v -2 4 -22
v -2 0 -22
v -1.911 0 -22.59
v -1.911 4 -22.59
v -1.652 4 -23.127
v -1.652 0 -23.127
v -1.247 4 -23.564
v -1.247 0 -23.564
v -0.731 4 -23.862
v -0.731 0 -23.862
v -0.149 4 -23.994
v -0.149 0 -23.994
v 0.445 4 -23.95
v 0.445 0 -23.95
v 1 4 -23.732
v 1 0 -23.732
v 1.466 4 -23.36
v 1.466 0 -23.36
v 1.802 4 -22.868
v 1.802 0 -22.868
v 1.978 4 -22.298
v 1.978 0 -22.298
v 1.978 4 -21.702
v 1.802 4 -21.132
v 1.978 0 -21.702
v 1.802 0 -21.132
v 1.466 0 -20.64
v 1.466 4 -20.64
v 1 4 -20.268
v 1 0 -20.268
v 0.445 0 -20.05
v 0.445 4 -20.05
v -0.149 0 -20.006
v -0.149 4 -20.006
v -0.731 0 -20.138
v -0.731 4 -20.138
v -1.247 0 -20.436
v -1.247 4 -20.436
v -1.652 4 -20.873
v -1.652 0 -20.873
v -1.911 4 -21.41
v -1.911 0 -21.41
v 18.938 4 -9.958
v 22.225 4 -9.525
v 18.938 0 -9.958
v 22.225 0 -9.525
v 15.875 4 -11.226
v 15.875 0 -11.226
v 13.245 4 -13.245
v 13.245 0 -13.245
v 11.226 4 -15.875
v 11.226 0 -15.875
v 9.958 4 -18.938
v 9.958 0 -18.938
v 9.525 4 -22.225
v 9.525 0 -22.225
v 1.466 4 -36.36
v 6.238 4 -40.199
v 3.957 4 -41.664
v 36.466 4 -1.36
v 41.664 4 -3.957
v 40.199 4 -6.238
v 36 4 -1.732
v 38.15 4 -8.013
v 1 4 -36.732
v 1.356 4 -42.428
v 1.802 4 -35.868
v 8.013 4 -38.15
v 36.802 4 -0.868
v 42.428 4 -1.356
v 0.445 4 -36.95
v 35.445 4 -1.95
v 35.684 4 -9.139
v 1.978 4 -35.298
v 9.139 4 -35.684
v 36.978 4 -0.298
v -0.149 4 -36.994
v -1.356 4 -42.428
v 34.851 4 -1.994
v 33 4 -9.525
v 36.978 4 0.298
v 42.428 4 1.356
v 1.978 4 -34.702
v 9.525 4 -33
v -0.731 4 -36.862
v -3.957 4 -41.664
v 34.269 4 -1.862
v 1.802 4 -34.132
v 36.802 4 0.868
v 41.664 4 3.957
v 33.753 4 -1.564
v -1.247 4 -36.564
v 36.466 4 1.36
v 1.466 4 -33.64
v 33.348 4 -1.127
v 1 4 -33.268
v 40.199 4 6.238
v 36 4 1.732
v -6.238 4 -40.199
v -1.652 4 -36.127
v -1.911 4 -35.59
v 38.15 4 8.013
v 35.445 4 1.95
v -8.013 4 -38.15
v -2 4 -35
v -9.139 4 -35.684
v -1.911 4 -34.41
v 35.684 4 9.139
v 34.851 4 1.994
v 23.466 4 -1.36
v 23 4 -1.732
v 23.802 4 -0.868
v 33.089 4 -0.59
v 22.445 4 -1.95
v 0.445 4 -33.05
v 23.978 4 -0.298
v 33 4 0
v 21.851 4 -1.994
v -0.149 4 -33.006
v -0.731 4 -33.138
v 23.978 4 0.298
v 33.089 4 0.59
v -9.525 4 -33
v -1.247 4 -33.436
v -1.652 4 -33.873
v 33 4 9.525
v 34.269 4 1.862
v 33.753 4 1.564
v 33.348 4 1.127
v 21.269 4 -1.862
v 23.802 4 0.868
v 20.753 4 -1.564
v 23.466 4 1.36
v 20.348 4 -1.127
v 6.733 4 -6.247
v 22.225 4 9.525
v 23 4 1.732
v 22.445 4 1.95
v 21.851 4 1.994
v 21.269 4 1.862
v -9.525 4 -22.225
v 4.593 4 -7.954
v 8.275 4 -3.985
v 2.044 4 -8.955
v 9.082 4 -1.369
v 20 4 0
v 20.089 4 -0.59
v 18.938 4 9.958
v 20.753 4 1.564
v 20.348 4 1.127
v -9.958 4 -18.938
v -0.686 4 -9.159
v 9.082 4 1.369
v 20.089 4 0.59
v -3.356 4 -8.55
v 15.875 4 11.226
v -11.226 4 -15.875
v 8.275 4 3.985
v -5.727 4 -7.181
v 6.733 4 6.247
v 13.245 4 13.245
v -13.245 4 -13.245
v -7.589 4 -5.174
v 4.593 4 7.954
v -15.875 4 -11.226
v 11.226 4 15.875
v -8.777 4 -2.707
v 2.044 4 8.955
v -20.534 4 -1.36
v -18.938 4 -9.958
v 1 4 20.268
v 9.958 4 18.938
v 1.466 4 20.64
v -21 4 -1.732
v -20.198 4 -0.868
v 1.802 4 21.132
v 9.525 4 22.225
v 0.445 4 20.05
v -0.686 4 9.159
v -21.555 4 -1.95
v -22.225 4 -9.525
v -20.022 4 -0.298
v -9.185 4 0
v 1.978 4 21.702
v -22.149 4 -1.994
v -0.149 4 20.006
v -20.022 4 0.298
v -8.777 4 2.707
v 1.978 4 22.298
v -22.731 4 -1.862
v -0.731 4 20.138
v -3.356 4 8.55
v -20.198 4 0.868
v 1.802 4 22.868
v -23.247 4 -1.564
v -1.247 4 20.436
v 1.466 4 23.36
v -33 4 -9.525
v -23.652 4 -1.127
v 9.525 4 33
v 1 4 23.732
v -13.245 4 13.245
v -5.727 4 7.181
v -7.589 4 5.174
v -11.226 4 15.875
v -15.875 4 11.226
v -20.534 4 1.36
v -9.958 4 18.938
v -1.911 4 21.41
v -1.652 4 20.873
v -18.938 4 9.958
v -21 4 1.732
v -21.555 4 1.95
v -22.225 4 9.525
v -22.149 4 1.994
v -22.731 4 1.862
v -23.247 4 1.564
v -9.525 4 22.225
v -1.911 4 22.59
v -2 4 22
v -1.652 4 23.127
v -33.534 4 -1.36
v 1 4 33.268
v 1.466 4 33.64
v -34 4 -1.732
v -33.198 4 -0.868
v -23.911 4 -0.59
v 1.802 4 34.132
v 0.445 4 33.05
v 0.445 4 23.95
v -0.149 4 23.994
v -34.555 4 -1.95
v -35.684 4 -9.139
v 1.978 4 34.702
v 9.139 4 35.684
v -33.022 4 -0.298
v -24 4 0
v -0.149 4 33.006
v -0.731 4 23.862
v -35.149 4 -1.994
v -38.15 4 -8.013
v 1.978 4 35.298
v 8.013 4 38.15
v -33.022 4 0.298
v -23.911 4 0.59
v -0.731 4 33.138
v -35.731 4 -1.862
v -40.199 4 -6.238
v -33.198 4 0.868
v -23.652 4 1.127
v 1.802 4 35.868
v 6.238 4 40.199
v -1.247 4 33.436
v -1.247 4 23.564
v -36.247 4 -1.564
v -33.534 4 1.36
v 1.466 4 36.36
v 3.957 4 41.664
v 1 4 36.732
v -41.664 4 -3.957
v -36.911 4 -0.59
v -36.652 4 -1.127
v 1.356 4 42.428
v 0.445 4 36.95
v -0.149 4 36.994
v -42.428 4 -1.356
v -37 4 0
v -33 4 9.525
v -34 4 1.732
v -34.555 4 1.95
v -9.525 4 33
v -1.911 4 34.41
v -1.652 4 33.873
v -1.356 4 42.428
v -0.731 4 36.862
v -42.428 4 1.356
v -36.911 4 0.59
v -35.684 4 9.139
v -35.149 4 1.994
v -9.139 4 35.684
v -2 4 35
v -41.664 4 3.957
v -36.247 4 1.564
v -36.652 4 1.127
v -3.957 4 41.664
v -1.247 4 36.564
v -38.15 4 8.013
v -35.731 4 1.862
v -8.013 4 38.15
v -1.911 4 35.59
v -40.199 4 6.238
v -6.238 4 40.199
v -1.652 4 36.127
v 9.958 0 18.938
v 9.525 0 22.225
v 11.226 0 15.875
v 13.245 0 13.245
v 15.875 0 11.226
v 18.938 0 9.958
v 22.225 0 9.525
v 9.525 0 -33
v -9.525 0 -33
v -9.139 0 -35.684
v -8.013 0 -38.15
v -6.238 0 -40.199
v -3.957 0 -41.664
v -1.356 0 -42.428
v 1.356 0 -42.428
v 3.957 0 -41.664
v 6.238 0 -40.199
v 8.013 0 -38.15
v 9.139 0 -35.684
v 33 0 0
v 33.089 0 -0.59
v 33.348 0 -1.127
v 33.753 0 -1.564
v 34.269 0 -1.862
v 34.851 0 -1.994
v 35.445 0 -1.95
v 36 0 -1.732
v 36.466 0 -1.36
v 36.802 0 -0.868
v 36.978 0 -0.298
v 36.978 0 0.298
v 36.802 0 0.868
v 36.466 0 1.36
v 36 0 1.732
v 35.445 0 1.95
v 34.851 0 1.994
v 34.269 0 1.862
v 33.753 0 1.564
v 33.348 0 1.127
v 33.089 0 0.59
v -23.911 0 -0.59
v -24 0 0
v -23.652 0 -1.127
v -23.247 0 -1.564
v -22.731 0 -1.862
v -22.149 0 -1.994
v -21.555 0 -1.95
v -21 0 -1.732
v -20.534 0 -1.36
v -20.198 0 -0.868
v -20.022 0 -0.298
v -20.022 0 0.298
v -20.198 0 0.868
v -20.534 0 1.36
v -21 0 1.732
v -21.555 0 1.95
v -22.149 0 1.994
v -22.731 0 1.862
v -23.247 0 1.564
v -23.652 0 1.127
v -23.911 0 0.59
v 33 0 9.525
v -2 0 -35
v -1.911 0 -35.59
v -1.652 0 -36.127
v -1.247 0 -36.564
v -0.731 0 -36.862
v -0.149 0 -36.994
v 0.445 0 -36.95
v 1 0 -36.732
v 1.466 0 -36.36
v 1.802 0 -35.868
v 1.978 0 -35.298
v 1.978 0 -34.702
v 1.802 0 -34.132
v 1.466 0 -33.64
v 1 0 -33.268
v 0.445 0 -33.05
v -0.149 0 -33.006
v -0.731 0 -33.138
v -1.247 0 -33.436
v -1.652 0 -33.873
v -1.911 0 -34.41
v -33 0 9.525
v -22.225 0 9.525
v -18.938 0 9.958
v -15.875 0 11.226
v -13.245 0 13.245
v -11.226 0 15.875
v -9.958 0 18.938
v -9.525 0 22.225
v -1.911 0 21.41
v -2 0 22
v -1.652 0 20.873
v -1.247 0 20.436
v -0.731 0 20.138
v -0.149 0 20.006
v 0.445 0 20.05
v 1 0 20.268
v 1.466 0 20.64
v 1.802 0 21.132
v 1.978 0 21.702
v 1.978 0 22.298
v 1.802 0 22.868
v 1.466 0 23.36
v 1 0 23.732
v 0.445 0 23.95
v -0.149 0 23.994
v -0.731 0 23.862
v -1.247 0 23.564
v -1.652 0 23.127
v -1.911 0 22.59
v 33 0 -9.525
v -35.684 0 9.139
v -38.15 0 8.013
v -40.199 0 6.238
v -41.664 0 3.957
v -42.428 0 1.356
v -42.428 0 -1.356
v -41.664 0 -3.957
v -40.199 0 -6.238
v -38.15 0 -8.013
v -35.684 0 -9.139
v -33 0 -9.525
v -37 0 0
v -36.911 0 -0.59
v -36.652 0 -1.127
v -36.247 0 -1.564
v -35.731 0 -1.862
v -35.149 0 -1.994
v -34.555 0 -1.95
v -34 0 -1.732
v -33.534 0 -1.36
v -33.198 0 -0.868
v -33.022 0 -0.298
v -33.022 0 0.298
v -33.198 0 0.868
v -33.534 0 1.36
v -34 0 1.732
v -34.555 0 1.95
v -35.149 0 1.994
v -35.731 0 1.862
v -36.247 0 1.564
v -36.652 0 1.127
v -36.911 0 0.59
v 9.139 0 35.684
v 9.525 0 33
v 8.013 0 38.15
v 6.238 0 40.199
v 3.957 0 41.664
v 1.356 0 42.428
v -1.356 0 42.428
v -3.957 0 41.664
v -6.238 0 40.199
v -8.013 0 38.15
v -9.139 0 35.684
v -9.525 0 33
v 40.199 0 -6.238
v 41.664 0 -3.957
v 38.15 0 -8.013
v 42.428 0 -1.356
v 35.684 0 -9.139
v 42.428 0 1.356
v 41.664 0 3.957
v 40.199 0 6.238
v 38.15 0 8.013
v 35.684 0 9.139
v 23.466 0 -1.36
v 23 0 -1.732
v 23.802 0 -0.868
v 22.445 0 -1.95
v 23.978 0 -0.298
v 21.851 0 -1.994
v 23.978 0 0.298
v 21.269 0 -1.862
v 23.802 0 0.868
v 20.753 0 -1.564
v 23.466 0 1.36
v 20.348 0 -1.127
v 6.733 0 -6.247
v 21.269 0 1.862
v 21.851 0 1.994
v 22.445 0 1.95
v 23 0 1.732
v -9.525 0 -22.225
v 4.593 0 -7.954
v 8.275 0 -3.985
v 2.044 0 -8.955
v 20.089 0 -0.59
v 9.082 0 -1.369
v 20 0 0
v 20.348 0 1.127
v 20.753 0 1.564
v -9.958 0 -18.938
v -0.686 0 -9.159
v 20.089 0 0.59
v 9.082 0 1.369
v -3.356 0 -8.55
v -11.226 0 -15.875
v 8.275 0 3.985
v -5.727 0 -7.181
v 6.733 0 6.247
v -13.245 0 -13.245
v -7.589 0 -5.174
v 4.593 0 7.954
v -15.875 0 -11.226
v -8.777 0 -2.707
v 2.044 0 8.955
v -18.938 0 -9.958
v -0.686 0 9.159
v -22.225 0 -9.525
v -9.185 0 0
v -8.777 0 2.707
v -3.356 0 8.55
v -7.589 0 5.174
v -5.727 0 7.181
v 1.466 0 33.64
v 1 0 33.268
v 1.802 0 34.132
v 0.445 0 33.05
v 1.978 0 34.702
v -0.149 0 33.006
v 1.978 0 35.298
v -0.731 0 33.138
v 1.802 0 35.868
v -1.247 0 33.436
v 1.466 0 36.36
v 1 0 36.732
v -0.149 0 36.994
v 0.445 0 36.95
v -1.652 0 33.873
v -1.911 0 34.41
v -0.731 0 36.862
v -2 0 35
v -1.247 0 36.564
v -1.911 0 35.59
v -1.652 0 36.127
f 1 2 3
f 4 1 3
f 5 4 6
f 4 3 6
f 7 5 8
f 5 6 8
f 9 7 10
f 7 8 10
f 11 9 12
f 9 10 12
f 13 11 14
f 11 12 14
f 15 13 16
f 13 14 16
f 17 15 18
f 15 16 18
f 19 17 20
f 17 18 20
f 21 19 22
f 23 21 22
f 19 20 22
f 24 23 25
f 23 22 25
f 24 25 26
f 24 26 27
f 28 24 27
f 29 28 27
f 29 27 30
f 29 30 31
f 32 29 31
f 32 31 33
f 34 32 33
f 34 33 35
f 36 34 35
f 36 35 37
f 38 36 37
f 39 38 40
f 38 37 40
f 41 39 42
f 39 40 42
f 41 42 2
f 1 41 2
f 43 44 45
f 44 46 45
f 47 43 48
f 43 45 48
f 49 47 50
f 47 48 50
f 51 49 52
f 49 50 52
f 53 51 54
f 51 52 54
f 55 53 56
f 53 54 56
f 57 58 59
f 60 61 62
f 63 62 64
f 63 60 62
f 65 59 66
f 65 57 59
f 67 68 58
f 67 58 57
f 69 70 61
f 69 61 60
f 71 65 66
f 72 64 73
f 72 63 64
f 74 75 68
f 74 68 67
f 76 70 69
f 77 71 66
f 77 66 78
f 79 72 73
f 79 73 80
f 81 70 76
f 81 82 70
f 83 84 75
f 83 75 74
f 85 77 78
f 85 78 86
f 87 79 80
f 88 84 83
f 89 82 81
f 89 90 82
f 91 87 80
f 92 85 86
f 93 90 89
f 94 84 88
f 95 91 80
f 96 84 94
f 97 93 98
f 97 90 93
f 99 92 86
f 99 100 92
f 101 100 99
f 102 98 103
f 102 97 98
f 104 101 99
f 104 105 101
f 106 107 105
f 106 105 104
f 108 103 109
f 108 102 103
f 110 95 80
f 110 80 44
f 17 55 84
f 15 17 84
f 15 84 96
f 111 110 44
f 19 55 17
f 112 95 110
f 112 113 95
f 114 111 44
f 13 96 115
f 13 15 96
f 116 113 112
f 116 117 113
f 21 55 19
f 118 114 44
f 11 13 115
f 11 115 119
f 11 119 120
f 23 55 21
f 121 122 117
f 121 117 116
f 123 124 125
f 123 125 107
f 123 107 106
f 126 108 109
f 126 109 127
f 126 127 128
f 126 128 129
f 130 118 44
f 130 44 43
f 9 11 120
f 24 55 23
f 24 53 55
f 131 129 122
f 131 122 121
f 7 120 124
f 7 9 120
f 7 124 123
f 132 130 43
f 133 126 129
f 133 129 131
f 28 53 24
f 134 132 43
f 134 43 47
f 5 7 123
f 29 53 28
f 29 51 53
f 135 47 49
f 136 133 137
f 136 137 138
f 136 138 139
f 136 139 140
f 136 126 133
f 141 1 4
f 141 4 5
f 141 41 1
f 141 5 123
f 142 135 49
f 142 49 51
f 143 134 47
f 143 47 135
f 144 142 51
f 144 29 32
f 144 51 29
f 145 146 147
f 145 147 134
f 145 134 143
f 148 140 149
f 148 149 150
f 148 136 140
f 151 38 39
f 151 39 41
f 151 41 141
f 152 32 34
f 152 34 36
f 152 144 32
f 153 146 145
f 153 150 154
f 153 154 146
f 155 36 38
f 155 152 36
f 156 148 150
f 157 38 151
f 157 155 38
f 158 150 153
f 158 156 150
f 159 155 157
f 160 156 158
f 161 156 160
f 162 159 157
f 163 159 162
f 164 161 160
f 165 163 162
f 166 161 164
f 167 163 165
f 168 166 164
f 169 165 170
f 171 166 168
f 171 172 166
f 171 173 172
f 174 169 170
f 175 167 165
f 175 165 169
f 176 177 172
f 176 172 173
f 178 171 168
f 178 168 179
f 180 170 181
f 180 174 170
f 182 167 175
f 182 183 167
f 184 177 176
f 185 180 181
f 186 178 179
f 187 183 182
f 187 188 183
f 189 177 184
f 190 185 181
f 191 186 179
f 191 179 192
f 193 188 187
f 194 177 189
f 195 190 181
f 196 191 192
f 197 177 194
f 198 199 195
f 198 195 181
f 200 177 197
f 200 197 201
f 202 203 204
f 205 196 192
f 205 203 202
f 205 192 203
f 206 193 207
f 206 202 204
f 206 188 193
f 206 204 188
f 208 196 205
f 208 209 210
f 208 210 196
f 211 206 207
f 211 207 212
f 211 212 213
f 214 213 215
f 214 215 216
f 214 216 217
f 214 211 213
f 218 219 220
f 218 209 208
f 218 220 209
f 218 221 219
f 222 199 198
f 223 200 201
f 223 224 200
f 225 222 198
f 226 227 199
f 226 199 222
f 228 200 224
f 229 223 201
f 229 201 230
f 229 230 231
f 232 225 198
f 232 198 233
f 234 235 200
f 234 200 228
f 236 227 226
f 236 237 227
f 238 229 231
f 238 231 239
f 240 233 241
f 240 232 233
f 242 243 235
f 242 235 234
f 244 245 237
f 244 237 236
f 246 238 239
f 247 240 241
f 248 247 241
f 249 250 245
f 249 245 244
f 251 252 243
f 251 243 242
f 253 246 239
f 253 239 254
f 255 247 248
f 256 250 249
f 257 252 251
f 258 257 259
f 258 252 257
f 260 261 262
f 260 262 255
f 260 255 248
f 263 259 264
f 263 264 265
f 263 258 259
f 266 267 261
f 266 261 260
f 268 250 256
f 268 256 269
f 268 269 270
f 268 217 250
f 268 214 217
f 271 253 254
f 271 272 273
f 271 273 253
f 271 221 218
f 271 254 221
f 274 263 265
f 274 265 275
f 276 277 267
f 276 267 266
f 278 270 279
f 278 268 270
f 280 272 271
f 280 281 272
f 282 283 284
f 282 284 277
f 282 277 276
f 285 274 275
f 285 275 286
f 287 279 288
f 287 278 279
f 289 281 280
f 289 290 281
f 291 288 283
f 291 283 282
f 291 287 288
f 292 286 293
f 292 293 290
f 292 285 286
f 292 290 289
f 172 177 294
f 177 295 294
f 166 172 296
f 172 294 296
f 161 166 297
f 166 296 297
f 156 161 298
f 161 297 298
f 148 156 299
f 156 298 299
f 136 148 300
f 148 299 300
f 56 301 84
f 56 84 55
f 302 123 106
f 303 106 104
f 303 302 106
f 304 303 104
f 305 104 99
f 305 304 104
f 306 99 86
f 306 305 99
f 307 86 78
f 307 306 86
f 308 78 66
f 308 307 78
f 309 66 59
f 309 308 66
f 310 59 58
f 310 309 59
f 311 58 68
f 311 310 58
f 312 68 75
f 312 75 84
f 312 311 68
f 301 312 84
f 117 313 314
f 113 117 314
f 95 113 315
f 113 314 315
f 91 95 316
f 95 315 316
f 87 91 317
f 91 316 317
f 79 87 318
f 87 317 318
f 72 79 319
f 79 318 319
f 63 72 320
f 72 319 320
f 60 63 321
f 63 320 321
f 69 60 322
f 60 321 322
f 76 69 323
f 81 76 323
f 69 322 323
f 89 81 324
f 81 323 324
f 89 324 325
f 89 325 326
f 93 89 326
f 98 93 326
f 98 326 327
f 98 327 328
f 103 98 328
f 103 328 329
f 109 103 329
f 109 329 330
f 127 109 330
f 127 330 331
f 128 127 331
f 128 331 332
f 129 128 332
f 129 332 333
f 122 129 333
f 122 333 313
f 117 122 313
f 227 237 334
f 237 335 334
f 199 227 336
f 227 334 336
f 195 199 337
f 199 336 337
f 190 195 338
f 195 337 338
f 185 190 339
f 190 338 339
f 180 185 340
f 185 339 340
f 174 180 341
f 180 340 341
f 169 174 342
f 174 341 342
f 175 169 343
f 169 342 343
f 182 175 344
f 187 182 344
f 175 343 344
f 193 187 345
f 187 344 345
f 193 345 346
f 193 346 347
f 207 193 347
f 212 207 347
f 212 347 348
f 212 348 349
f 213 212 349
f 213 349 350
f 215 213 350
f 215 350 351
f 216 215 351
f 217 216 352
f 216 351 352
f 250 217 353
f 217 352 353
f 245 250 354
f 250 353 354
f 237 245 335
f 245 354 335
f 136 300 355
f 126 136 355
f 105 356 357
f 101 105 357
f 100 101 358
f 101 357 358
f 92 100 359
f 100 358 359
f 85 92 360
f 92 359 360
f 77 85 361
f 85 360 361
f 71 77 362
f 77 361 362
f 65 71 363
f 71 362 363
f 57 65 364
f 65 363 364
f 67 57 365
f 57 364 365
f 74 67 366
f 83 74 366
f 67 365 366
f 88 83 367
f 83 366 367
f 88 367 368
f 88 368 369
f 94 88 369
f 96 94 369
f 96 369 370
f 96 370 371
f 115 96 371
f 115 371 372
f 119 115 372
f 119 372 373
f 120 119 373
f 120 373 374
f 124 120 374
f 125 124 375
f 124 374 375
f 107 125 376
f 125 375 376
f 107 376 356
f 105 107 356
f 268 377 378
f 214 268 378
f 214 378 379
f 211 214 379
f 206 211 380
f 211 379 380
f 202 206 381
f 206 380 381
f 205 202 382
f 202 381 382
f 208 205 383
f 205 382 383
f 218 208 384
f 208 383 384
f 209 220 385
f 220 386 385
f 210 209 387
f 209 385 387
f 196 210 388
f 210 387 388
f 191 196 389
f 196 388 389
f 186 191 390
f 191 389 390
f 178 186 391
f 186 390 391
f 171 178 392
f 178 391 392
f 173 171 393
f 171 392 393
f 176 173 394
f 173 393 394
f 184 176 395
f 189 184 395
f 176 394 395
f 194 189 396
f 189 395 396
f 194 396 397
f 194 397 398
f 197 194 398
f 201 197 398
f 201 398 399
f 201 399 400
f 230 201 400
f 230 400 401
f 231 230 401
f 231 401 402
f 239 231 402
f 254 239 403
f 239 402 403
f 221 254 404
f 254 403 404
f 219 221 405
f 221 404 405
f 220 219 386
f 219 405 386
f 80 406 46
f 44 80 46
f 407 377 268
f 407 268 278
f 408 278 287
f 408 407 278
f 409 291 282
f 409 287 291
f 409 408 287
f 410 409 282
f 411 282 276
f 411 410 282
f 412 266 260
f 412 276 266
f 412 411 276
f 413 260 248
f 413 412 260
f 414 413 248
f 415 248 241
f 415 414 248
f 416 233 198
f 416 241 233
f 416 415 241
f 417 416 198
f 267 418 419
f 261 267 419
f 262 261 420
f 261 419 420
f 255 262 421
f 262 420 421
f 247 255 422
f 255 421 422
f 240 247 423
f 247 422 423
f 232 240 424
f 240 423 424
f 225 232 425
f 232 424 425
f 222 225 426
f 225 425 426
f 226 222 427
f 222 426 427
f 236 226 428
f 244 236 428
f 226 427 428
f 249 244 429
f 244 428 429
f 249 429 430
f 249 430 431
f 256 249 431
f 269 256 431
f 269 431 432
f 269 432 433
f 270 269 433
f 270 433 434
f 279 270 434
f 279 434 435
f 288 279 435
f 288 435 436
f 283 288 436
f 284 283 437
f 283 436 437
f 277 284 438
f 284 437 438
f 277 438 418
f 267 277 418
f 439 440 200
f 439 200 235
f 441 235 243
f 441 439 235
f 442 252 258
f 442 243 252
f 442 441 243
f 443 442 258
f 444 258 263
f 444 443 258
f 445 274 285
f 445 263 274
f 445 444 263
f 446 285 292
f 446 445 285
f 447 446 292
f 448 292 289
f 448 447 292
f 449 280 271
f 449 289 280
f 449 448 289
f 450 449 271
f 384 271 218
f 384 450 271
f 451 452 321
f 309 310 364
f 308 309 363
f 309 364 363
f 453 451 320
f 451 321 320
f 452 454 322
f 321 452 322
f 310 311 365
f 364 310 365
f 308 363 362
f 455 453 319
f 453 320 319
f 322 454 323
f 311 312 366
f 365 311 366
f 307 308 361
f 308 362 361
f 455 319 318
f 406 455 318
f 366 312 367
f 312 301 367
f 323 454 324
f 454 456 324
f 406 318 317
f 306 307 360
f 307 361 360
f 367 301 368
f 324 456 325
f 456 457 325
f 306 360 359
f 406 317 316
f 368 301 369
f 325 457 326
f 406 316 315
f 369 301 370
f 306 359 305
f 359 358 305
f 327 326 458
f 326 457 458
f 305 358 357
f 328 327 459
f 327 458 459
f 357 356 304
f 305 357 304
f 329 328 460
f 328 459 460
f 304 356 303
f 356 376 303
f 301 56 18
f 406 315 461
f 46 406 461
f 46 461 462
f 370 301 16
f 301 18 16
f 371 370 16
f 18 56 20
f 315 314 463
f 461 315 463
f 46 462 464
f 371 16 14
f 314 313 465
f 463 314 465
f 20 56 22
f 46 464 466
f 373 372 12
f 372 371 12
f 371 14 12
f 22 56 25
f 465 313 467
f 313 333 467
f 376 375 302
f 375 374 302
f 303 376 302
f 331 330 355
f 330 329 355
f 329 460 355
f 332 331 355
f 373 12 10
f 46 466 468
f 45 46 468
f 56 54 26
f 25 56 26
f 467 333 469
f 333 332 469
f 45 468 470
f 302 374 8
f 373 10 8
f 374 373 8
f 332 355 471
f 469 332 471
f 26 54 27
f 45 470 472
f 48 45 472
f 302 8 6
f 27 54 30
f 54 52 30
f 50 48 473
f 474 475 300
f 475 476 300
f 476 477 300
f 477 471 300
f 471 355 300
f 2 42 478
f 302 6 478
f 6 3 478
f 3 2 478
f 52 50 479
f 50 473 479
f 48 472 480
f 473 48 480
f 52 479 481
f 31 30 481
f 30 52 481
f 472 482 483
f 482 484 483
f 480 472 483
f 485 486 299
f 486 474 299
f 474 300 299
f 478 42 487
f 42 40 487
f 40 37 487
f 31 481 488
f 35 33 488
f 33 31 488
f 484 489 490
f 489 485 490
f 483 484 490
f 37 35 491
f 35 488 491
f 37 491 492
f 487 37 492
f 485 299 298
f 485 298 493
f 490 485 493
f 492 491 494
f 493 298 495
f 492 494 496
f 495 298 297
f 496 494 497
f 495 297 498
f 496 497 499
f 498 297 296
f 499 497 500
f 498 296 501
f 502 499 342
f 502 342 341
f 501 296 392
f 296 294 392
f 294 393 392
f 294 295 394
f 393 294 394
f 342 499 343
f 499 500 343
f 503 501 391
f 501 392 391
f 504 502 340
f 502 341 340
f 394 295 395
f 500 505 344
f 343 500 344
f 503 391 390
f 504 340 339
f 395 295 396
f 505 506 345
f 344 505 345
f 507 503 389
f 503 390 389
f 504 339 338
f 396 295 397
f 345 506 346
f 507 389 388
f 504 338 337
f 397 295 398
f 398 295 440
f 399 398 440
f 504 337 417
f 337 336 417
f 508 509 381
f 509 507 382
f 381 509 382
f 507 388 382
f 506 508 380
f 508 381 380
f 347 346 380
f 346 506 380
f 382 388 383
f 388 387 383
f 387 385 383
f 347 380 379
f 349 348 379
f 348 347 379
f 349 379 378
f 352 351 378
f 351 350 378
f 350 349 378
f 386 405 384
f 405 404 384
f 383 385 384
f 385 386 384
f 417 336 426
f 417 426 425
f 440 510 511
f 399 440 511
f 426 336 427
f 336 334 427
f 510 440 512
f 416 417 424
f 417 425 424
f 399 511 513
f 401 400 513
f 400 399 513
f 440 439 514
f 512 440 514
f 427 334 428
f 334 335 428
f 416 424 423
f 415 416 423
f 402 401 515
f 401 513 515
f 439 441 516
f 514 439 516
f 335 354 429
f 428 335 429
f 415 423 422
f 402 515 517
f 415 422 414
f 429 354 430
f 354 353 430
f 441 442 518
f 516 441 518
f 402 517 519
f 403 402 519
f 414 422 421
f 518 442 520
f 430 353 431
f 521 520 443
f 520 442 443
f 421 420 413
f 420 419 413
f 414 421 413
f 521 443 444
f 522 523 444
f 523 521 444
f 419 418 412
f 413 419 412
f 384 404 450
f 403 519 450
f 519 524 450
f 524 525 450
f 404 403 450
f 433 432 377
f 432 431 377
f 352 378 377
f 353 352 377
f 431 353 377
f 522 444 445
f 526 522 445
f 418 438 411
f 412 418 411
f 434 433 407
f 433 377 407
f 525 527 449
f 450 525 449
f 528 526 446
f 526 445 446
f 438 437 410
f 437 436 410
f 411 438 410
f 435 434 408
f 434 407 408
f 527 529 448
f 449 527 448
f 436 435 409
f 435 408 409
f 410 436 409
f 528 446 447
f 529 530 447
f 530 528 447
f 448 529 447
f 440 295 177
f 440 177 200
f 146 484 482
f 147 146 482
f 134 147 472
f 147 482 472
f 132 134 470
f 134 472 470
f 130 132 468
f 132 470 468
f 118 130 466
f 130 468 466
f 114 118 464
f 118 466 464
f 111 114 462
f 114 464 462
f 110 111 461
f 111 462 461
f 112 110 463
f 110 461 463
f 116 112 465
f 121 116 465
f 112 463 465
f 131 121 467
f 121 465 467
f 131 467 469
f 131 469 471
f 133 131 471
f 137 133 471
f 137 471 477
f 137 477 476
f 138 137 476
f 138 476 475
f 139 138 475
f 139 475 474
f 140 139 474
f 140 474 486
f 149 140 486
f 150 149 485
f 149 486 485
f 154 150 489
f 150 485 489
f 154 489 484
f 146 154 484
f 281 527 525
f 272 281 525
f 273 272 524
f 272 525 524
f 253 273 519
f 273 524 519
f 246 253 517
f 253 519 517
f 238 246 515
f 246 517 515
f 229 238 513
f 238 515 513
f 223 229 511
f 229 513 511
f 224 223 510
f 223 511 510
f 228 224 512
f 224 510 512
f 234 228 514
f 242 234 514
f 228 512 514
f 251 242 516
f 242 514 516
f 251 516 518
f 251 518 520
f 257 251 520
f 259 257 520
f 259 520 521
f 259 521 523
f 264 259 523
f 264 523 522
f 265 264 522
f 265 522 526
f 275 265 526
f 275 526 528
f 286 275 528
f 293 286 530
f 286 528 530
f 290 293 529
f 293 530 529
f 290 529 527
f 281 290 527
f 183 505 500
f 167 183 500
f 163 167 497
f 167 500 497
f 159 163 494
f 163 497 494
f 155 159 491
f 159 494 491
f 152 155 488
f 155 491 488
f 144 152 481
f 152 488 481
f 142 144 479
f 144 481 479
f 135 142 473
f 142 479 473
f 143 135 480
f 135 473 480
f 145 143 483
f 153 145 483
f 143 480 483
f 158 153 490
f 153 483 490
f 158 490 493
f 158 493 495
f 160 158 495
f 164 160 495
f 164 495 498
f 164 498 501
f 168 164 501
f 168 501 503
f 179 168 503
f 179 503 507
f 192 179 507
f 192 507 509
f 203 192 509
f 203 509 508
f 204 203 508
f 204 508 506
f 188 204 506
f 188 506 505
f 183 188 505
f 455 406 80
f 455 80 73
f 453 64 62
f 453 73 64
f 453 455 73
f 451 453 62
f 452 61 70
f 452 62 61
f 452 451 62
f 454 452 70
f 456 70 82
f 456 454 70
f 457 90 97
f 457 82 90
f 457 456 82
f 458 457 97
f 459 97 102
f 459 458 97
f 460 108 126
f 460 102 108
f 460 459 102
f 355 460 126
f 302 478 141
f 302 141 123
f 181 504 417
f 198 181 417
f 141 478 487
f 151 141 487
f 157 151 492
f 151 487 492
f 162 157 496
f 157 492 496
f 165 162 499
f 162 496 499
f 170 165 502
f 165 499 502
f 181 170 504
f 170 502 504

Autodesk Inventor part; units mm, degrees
ref_plane "YZ Plane" through (0, 0, 0) normal (1, 0, 0) x (0, 1, 0)
ref_plane "XZ Plane" through (0, 0, 0) normal (0, 1, 0) x (-1, 0, 0)
ref_plane "XY Plane" through (0, 0, 0) normal (0, 0, 1) x (1, 0, 0)
sketch "Sketch1" plane through (0, 0, 0) normal (0, 1, 0) x (-1, 0, 0)
  line L0 (-9.525, -33) -> (-9.525, -22.225)
  line L1 (-9.525, 22.225) -> (-9.525, 33)
  line L2 (33, 9.525) -> (22.225, 9.525)
  line L3 (-22.225, 9.525) -> (-33, 9.525)
  line L4 (9.525, 33) -> (9.525, 22.225)
  line L5 (9.525, -22.225) -> (9.525, -33)
  line L6 (-33, -9.525) -> (-22.225, -9.525)
  line L7 (22.225, -9.525) -> (33, -9.525)
  line L8 (77.6073, 0) -> (-79.7857, 0) projected
  line L9 (0, -77.9019) -> (0, 71.2895) projected
  circle A0 centre (-35, 0) radius 2
  circle A1 centre (-22, 0) radius 2
  circle A2 centre (0, -22) radius 2
  circle A3 centre (0, -35) radius 2
  circle A4 centre (22, 0) radius 2
  circle A5 centre (35, 0) radius 2
  circle A6 centre (0, 22) radius 2
  circle A7 centre (0, 35) radius 2
  circle A8 centre (0, 0) radius 9.185
  line L10 (-57.3009, 49.9764) -> (55.1226, 49.9764) construction
  line L11 (55.1226, 49.9764) -> (55.1226, -56.5889) construction
  line L12 (55.1226, -56.5889) -> (-57.3009, -56.5889) construction
  line L13 (-57.3009, -56.5889) -> (-57.3009, 49.9764) construction
  arc A9 (9.525, 33) -> (0, 42.525) centre (0, 33) ccw
  arc A10 (0, 42.525) -> (-9.525, 33) centre (0, 33) ccw
  arc A11 (42.525, 0) -> (33, 9.525) centre (33, 0) ccw
  arc A12 (33, -9.525) -> (42.525, 0) centre (33, 0) ccw
  arc A13 (0, -42.525) -> (9.525, -33) centre (0, -33) ccw
  arc A14 (-9.525, -33) -> (0, -42.525) centre (0, -33) ccw
  arc A15 (-42.525, 0) -> (-33, -9.525) centre (-33, 0) ccw
  arc A16 (-33, 9.525) -> (-42.525, 0) centre (-33, 0) ccw
  arc A17 (9.525, 22.225) -> (22.225, 9.525) centre (22.225, 22.225) ccw
  arc A18 (22.225, -9.525) -> (9.525, -22.225) centre (22.225, -22.225) ccw
  arc A19 (-9.525, -22.225) -> (-22.225, -9.525) centre (-22.225, -22.225) ccw
  arc A20 (-22.225, 9.525) -> (-9.525, 22.225) centre (-22.225, 22.225) ccw
  point P0 (0, 42.525)
  point P1 (42.525, 0)
  point P2 (0, -42.525)
  point P3 (-42.525, 0)
  point P4 (42.525, 0)
  point P5 (0, 42.525)
  point P6 (-42.525, 0)
  dimension "d2" = 360
  dimension "d4" = 4
  dimension "d5" = 22
  dimension "d6" = 35
  dimension "d7" = 18.37
  dimension "d39" = 9.525
  dimension "d41" = 9.525
  dimension "d46" = 12.7
extrude "Extrusion1" add sketch "Sketch1" along normal blind 4 contours L0 A19 L6 A15 L8 A0 A1 A8 L9 A2 A3 A14 | L9 A3 A2 A8 L8 A4 A5 A12 L7 A18 L5 A13 | A16 L3 A20 L1 A10 L9 A7 A6 A8 L8 A1 A0 | L8 A5 A4 A8 L9 A6 A7 A9 L4 A17 L2 A11
properties part number "DriveMotorPlate"
